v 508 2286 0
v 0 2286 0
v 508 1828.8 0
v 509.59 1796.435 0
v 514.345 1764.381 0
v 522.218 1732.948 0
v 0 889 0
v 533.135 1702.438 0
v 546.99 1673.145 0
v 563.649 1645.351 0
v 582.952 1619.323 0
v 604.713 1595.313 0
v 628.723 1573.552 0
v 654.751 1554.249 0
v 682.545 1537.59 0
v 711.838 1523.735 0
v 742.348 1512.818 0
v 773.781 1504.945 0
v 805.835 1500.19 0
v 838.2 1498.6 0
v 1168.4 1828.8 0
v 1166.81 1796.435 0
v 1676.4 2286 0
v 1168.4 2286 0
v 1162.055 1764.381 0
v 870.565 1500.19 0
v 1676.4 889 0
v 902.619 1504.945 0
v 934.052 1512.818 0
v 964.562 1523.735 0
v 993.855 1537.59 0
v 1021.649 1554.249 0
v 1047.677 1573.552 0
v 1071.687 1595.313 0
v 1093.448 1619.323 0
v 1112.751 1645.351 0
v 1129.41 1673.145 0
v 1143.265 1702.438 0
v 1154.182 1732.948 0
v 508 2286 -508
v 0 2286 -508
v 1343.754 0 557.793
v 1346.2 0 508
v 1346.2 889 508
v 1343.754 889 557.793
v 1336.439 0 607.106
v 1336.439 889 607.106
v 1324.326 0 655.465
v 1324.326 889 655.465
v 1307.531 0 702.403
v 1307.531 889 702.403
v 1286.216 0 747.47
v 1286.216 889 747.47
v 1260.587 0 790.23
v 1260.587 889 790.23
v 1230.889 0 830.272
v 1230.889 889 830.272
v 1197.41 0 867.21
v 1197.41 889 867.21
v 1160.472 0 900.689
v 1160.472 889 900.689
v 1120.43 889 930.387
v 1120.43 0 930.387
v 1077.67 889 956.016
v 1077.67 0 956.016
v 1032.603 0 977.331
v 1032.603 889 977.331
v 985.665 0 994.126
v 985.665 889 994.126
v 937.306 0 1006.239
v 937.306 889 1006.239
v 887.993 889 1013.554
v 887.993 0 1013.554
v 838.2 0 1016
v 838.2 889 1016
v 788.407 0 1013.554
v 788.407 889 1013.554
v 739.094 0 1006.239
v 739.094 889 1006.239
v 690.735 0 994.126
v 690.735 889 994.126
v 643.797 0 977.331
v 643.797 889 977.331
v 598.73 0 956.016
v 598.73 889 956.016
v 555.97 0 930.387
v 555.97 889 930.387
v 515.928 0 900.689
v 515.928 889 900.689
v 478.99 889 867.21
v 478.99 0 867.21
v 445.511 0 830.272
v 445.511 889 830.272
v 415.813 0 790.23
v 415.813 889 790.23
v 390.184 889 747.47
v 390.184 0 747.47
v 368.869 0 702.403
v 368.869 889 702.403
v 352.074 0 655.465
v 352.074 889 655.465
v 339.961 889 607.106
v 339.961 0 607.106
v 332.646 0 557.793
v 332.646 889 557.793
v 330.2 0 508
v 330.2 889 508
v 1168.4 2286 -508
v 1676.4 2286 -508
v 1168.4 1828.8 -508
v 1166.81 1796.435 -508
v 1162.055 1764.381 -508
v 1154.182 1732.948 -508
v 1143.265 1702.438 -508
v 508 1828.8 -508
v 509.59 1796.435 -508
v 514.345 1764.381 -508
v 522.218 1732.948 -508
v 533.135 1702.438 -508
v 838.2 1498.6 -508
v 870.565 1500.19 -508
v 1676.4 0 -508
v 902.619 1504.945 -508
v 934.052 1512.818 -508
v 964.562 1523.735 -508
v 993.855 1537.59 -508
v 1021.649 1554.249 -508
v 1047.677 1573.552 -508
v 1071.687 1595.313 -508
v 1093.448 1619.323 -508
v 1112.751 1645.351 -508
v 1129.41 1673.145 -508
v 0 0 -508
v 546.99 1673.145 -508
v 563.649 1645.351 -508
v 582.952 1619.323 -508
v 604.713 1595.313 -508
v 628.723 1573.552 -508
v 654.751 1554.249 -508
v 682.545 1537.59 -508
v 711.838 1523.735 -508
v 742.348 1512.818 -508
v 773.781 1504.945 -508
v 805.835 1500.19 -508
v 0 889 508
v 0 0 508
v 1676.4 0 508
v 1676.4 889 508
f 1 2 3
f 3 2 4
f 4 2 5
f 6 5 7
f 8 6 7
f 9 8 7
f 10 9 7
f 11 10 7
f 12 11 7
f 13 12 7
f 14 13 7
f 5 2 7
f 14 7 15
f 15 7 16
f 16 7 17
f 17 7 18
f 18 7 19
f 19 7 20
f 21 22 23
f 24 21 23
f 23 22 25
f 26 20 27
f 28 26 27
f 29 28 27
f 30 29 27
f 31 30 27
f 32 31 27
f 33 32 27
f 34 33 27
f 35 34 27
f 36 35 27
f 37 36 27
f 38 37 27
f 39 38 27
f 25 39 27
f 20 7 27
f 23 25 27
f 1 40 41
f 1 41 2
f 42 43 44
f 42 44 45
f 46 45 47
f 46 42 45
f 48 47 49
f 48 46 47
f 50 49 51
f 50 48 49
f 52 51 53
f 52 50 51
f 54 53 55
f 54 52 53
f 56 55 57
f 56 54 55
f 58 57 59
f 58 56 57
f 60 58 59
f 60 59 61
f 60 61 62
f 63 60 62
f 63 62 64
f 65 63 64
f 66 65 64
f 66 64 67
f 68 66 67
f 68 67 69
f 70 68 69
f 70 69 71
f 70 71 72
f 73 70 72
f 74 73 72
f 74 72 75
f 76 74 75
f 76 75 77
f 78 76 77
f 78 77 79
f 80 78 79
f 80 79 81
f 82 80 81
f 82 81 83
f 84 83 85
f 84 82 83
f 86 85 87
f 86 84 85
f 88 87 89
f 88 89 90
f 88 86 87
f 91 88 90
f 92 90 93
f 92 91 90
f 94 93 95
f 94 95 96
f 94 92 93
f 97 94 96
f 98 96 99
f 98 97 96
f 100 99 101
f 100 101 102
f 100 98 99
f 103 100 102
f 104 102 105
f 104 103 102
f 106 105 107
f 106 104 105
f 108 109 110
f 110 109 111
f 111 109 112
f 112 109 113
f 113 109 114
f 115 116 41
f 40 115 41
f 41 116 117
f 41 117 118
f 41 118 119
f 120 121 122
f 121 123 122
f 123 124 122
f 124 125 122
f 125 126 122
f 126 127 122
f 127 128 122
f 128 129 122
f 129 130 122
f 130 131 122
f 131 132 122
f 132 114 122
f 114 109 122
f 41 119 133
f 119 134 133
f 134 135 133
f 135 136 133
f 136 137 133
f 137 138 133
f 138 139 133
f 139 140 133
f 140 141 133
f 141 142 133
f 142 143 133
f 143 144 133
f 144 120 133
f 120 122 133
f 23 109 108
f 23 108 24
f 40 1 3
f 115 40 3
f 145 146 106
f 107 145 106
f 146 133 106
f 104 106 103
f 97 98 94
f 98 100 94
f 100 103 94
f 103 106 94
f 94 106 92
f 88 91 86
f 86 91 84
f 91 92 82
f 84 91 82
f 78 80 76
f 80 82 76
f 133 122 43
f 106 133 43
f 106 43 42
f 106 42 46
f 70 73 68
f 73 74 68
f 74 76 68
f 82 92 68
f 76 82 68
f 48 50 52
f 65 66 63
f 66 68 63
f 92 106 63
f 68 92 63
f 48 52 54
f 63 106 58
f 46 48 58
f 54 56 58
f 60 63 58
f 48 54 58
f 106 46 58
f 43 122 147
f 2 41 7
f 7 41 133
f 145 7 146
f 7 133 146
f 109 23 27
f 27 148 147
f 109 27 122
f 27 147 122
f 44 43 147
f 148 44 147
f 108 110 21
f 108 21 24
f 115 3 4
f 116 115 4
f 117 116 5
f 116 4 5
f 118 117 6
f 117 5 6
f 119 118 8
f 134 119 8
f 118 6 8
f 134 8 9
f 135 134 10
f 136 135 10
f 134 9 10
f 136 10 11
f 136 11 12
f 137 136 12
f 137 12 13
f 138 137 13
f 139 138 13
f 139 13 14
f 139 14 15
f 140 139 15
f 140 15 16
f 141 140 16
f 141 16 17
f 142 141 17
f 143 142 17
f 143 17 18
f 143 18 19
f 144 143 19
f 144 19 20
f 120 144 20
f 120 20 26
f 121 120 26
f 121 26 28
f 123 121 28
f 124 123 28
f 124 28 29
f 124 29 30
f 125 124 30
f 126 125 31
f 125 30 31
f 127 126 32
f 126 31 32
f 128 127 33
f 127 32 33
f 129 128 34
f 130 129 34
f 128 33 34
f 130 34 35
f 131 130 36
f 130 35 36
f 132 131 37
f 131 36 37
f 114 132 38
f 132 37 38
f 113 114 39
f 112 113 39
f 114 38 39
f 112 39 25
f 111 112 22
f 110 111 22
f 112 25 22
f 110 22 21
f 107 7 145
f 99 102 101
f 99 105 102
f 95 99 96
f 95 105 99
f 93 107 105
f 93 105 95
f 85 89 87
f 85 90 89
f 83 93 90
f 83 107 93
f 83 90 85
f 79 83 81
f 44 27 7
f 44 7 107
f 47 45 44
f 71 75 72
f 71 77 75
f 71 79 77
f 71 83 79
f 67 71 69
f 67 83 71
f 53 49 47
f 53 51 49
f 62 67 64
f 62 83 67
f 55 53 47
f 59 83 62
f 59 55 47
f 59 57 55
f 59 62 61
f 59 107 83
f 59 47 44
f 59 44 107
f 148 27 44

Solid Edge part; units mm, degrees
sketch "Sketch1" plane through (0, 0, 0) normal (0, 1, 0) x (-1, 0, 0)
  line L0 (0, 508) -> (-330.2, 508)
  line L1 (0, 0) -> (0, 508)
  line L2 (-1676.4, 0) -> (0, 0)
  line L3 (-1676.4, 508) -> (-1676.4, 0)
  line L4 (-1346.2, 508) -> (-1676.4, 508)
  arc A0 (-1346.2, 508) -> (-330.2, 508) centre (-838.2, 508) cw
extrude "Protrusion1" add sketch "Sketch1" along normal blind 889
sketch "Sketch2" plane through (0, 0, 0) normal (0, 1, 0) x (-1, 0, 0)
  line L0 (0, -508) -> (0, 0)
  line L1 (0, 0) -> (-1676.4, 0)
  line L2 (-1676.4, 0) -> (-1676.4, -508)
  line L3 (-1676.4, -508) -> (0, -508)
extrude "ExtrudedProtrusion_7" add sketch "Sketch2" along normal blind 2286
sketch "Sketch3" plane through (838.2, 1587.5, 0) normal (0, 0, 1) x (0, 1, 0)
  line L0 (698.5, 330.2) -> (241.3, 330.2)
  arc A0 (241.3, 330.2) -> (241.3, -330.2) centre (241.3, 0) ccw
  line L1 (241.3, -330.2) -> (698.5, -330.2)
extrude "ExtrudedCutout_2" cut sketch "Sketch3" against normal blind 508 material side at (508.05, 2057.4, 0)
